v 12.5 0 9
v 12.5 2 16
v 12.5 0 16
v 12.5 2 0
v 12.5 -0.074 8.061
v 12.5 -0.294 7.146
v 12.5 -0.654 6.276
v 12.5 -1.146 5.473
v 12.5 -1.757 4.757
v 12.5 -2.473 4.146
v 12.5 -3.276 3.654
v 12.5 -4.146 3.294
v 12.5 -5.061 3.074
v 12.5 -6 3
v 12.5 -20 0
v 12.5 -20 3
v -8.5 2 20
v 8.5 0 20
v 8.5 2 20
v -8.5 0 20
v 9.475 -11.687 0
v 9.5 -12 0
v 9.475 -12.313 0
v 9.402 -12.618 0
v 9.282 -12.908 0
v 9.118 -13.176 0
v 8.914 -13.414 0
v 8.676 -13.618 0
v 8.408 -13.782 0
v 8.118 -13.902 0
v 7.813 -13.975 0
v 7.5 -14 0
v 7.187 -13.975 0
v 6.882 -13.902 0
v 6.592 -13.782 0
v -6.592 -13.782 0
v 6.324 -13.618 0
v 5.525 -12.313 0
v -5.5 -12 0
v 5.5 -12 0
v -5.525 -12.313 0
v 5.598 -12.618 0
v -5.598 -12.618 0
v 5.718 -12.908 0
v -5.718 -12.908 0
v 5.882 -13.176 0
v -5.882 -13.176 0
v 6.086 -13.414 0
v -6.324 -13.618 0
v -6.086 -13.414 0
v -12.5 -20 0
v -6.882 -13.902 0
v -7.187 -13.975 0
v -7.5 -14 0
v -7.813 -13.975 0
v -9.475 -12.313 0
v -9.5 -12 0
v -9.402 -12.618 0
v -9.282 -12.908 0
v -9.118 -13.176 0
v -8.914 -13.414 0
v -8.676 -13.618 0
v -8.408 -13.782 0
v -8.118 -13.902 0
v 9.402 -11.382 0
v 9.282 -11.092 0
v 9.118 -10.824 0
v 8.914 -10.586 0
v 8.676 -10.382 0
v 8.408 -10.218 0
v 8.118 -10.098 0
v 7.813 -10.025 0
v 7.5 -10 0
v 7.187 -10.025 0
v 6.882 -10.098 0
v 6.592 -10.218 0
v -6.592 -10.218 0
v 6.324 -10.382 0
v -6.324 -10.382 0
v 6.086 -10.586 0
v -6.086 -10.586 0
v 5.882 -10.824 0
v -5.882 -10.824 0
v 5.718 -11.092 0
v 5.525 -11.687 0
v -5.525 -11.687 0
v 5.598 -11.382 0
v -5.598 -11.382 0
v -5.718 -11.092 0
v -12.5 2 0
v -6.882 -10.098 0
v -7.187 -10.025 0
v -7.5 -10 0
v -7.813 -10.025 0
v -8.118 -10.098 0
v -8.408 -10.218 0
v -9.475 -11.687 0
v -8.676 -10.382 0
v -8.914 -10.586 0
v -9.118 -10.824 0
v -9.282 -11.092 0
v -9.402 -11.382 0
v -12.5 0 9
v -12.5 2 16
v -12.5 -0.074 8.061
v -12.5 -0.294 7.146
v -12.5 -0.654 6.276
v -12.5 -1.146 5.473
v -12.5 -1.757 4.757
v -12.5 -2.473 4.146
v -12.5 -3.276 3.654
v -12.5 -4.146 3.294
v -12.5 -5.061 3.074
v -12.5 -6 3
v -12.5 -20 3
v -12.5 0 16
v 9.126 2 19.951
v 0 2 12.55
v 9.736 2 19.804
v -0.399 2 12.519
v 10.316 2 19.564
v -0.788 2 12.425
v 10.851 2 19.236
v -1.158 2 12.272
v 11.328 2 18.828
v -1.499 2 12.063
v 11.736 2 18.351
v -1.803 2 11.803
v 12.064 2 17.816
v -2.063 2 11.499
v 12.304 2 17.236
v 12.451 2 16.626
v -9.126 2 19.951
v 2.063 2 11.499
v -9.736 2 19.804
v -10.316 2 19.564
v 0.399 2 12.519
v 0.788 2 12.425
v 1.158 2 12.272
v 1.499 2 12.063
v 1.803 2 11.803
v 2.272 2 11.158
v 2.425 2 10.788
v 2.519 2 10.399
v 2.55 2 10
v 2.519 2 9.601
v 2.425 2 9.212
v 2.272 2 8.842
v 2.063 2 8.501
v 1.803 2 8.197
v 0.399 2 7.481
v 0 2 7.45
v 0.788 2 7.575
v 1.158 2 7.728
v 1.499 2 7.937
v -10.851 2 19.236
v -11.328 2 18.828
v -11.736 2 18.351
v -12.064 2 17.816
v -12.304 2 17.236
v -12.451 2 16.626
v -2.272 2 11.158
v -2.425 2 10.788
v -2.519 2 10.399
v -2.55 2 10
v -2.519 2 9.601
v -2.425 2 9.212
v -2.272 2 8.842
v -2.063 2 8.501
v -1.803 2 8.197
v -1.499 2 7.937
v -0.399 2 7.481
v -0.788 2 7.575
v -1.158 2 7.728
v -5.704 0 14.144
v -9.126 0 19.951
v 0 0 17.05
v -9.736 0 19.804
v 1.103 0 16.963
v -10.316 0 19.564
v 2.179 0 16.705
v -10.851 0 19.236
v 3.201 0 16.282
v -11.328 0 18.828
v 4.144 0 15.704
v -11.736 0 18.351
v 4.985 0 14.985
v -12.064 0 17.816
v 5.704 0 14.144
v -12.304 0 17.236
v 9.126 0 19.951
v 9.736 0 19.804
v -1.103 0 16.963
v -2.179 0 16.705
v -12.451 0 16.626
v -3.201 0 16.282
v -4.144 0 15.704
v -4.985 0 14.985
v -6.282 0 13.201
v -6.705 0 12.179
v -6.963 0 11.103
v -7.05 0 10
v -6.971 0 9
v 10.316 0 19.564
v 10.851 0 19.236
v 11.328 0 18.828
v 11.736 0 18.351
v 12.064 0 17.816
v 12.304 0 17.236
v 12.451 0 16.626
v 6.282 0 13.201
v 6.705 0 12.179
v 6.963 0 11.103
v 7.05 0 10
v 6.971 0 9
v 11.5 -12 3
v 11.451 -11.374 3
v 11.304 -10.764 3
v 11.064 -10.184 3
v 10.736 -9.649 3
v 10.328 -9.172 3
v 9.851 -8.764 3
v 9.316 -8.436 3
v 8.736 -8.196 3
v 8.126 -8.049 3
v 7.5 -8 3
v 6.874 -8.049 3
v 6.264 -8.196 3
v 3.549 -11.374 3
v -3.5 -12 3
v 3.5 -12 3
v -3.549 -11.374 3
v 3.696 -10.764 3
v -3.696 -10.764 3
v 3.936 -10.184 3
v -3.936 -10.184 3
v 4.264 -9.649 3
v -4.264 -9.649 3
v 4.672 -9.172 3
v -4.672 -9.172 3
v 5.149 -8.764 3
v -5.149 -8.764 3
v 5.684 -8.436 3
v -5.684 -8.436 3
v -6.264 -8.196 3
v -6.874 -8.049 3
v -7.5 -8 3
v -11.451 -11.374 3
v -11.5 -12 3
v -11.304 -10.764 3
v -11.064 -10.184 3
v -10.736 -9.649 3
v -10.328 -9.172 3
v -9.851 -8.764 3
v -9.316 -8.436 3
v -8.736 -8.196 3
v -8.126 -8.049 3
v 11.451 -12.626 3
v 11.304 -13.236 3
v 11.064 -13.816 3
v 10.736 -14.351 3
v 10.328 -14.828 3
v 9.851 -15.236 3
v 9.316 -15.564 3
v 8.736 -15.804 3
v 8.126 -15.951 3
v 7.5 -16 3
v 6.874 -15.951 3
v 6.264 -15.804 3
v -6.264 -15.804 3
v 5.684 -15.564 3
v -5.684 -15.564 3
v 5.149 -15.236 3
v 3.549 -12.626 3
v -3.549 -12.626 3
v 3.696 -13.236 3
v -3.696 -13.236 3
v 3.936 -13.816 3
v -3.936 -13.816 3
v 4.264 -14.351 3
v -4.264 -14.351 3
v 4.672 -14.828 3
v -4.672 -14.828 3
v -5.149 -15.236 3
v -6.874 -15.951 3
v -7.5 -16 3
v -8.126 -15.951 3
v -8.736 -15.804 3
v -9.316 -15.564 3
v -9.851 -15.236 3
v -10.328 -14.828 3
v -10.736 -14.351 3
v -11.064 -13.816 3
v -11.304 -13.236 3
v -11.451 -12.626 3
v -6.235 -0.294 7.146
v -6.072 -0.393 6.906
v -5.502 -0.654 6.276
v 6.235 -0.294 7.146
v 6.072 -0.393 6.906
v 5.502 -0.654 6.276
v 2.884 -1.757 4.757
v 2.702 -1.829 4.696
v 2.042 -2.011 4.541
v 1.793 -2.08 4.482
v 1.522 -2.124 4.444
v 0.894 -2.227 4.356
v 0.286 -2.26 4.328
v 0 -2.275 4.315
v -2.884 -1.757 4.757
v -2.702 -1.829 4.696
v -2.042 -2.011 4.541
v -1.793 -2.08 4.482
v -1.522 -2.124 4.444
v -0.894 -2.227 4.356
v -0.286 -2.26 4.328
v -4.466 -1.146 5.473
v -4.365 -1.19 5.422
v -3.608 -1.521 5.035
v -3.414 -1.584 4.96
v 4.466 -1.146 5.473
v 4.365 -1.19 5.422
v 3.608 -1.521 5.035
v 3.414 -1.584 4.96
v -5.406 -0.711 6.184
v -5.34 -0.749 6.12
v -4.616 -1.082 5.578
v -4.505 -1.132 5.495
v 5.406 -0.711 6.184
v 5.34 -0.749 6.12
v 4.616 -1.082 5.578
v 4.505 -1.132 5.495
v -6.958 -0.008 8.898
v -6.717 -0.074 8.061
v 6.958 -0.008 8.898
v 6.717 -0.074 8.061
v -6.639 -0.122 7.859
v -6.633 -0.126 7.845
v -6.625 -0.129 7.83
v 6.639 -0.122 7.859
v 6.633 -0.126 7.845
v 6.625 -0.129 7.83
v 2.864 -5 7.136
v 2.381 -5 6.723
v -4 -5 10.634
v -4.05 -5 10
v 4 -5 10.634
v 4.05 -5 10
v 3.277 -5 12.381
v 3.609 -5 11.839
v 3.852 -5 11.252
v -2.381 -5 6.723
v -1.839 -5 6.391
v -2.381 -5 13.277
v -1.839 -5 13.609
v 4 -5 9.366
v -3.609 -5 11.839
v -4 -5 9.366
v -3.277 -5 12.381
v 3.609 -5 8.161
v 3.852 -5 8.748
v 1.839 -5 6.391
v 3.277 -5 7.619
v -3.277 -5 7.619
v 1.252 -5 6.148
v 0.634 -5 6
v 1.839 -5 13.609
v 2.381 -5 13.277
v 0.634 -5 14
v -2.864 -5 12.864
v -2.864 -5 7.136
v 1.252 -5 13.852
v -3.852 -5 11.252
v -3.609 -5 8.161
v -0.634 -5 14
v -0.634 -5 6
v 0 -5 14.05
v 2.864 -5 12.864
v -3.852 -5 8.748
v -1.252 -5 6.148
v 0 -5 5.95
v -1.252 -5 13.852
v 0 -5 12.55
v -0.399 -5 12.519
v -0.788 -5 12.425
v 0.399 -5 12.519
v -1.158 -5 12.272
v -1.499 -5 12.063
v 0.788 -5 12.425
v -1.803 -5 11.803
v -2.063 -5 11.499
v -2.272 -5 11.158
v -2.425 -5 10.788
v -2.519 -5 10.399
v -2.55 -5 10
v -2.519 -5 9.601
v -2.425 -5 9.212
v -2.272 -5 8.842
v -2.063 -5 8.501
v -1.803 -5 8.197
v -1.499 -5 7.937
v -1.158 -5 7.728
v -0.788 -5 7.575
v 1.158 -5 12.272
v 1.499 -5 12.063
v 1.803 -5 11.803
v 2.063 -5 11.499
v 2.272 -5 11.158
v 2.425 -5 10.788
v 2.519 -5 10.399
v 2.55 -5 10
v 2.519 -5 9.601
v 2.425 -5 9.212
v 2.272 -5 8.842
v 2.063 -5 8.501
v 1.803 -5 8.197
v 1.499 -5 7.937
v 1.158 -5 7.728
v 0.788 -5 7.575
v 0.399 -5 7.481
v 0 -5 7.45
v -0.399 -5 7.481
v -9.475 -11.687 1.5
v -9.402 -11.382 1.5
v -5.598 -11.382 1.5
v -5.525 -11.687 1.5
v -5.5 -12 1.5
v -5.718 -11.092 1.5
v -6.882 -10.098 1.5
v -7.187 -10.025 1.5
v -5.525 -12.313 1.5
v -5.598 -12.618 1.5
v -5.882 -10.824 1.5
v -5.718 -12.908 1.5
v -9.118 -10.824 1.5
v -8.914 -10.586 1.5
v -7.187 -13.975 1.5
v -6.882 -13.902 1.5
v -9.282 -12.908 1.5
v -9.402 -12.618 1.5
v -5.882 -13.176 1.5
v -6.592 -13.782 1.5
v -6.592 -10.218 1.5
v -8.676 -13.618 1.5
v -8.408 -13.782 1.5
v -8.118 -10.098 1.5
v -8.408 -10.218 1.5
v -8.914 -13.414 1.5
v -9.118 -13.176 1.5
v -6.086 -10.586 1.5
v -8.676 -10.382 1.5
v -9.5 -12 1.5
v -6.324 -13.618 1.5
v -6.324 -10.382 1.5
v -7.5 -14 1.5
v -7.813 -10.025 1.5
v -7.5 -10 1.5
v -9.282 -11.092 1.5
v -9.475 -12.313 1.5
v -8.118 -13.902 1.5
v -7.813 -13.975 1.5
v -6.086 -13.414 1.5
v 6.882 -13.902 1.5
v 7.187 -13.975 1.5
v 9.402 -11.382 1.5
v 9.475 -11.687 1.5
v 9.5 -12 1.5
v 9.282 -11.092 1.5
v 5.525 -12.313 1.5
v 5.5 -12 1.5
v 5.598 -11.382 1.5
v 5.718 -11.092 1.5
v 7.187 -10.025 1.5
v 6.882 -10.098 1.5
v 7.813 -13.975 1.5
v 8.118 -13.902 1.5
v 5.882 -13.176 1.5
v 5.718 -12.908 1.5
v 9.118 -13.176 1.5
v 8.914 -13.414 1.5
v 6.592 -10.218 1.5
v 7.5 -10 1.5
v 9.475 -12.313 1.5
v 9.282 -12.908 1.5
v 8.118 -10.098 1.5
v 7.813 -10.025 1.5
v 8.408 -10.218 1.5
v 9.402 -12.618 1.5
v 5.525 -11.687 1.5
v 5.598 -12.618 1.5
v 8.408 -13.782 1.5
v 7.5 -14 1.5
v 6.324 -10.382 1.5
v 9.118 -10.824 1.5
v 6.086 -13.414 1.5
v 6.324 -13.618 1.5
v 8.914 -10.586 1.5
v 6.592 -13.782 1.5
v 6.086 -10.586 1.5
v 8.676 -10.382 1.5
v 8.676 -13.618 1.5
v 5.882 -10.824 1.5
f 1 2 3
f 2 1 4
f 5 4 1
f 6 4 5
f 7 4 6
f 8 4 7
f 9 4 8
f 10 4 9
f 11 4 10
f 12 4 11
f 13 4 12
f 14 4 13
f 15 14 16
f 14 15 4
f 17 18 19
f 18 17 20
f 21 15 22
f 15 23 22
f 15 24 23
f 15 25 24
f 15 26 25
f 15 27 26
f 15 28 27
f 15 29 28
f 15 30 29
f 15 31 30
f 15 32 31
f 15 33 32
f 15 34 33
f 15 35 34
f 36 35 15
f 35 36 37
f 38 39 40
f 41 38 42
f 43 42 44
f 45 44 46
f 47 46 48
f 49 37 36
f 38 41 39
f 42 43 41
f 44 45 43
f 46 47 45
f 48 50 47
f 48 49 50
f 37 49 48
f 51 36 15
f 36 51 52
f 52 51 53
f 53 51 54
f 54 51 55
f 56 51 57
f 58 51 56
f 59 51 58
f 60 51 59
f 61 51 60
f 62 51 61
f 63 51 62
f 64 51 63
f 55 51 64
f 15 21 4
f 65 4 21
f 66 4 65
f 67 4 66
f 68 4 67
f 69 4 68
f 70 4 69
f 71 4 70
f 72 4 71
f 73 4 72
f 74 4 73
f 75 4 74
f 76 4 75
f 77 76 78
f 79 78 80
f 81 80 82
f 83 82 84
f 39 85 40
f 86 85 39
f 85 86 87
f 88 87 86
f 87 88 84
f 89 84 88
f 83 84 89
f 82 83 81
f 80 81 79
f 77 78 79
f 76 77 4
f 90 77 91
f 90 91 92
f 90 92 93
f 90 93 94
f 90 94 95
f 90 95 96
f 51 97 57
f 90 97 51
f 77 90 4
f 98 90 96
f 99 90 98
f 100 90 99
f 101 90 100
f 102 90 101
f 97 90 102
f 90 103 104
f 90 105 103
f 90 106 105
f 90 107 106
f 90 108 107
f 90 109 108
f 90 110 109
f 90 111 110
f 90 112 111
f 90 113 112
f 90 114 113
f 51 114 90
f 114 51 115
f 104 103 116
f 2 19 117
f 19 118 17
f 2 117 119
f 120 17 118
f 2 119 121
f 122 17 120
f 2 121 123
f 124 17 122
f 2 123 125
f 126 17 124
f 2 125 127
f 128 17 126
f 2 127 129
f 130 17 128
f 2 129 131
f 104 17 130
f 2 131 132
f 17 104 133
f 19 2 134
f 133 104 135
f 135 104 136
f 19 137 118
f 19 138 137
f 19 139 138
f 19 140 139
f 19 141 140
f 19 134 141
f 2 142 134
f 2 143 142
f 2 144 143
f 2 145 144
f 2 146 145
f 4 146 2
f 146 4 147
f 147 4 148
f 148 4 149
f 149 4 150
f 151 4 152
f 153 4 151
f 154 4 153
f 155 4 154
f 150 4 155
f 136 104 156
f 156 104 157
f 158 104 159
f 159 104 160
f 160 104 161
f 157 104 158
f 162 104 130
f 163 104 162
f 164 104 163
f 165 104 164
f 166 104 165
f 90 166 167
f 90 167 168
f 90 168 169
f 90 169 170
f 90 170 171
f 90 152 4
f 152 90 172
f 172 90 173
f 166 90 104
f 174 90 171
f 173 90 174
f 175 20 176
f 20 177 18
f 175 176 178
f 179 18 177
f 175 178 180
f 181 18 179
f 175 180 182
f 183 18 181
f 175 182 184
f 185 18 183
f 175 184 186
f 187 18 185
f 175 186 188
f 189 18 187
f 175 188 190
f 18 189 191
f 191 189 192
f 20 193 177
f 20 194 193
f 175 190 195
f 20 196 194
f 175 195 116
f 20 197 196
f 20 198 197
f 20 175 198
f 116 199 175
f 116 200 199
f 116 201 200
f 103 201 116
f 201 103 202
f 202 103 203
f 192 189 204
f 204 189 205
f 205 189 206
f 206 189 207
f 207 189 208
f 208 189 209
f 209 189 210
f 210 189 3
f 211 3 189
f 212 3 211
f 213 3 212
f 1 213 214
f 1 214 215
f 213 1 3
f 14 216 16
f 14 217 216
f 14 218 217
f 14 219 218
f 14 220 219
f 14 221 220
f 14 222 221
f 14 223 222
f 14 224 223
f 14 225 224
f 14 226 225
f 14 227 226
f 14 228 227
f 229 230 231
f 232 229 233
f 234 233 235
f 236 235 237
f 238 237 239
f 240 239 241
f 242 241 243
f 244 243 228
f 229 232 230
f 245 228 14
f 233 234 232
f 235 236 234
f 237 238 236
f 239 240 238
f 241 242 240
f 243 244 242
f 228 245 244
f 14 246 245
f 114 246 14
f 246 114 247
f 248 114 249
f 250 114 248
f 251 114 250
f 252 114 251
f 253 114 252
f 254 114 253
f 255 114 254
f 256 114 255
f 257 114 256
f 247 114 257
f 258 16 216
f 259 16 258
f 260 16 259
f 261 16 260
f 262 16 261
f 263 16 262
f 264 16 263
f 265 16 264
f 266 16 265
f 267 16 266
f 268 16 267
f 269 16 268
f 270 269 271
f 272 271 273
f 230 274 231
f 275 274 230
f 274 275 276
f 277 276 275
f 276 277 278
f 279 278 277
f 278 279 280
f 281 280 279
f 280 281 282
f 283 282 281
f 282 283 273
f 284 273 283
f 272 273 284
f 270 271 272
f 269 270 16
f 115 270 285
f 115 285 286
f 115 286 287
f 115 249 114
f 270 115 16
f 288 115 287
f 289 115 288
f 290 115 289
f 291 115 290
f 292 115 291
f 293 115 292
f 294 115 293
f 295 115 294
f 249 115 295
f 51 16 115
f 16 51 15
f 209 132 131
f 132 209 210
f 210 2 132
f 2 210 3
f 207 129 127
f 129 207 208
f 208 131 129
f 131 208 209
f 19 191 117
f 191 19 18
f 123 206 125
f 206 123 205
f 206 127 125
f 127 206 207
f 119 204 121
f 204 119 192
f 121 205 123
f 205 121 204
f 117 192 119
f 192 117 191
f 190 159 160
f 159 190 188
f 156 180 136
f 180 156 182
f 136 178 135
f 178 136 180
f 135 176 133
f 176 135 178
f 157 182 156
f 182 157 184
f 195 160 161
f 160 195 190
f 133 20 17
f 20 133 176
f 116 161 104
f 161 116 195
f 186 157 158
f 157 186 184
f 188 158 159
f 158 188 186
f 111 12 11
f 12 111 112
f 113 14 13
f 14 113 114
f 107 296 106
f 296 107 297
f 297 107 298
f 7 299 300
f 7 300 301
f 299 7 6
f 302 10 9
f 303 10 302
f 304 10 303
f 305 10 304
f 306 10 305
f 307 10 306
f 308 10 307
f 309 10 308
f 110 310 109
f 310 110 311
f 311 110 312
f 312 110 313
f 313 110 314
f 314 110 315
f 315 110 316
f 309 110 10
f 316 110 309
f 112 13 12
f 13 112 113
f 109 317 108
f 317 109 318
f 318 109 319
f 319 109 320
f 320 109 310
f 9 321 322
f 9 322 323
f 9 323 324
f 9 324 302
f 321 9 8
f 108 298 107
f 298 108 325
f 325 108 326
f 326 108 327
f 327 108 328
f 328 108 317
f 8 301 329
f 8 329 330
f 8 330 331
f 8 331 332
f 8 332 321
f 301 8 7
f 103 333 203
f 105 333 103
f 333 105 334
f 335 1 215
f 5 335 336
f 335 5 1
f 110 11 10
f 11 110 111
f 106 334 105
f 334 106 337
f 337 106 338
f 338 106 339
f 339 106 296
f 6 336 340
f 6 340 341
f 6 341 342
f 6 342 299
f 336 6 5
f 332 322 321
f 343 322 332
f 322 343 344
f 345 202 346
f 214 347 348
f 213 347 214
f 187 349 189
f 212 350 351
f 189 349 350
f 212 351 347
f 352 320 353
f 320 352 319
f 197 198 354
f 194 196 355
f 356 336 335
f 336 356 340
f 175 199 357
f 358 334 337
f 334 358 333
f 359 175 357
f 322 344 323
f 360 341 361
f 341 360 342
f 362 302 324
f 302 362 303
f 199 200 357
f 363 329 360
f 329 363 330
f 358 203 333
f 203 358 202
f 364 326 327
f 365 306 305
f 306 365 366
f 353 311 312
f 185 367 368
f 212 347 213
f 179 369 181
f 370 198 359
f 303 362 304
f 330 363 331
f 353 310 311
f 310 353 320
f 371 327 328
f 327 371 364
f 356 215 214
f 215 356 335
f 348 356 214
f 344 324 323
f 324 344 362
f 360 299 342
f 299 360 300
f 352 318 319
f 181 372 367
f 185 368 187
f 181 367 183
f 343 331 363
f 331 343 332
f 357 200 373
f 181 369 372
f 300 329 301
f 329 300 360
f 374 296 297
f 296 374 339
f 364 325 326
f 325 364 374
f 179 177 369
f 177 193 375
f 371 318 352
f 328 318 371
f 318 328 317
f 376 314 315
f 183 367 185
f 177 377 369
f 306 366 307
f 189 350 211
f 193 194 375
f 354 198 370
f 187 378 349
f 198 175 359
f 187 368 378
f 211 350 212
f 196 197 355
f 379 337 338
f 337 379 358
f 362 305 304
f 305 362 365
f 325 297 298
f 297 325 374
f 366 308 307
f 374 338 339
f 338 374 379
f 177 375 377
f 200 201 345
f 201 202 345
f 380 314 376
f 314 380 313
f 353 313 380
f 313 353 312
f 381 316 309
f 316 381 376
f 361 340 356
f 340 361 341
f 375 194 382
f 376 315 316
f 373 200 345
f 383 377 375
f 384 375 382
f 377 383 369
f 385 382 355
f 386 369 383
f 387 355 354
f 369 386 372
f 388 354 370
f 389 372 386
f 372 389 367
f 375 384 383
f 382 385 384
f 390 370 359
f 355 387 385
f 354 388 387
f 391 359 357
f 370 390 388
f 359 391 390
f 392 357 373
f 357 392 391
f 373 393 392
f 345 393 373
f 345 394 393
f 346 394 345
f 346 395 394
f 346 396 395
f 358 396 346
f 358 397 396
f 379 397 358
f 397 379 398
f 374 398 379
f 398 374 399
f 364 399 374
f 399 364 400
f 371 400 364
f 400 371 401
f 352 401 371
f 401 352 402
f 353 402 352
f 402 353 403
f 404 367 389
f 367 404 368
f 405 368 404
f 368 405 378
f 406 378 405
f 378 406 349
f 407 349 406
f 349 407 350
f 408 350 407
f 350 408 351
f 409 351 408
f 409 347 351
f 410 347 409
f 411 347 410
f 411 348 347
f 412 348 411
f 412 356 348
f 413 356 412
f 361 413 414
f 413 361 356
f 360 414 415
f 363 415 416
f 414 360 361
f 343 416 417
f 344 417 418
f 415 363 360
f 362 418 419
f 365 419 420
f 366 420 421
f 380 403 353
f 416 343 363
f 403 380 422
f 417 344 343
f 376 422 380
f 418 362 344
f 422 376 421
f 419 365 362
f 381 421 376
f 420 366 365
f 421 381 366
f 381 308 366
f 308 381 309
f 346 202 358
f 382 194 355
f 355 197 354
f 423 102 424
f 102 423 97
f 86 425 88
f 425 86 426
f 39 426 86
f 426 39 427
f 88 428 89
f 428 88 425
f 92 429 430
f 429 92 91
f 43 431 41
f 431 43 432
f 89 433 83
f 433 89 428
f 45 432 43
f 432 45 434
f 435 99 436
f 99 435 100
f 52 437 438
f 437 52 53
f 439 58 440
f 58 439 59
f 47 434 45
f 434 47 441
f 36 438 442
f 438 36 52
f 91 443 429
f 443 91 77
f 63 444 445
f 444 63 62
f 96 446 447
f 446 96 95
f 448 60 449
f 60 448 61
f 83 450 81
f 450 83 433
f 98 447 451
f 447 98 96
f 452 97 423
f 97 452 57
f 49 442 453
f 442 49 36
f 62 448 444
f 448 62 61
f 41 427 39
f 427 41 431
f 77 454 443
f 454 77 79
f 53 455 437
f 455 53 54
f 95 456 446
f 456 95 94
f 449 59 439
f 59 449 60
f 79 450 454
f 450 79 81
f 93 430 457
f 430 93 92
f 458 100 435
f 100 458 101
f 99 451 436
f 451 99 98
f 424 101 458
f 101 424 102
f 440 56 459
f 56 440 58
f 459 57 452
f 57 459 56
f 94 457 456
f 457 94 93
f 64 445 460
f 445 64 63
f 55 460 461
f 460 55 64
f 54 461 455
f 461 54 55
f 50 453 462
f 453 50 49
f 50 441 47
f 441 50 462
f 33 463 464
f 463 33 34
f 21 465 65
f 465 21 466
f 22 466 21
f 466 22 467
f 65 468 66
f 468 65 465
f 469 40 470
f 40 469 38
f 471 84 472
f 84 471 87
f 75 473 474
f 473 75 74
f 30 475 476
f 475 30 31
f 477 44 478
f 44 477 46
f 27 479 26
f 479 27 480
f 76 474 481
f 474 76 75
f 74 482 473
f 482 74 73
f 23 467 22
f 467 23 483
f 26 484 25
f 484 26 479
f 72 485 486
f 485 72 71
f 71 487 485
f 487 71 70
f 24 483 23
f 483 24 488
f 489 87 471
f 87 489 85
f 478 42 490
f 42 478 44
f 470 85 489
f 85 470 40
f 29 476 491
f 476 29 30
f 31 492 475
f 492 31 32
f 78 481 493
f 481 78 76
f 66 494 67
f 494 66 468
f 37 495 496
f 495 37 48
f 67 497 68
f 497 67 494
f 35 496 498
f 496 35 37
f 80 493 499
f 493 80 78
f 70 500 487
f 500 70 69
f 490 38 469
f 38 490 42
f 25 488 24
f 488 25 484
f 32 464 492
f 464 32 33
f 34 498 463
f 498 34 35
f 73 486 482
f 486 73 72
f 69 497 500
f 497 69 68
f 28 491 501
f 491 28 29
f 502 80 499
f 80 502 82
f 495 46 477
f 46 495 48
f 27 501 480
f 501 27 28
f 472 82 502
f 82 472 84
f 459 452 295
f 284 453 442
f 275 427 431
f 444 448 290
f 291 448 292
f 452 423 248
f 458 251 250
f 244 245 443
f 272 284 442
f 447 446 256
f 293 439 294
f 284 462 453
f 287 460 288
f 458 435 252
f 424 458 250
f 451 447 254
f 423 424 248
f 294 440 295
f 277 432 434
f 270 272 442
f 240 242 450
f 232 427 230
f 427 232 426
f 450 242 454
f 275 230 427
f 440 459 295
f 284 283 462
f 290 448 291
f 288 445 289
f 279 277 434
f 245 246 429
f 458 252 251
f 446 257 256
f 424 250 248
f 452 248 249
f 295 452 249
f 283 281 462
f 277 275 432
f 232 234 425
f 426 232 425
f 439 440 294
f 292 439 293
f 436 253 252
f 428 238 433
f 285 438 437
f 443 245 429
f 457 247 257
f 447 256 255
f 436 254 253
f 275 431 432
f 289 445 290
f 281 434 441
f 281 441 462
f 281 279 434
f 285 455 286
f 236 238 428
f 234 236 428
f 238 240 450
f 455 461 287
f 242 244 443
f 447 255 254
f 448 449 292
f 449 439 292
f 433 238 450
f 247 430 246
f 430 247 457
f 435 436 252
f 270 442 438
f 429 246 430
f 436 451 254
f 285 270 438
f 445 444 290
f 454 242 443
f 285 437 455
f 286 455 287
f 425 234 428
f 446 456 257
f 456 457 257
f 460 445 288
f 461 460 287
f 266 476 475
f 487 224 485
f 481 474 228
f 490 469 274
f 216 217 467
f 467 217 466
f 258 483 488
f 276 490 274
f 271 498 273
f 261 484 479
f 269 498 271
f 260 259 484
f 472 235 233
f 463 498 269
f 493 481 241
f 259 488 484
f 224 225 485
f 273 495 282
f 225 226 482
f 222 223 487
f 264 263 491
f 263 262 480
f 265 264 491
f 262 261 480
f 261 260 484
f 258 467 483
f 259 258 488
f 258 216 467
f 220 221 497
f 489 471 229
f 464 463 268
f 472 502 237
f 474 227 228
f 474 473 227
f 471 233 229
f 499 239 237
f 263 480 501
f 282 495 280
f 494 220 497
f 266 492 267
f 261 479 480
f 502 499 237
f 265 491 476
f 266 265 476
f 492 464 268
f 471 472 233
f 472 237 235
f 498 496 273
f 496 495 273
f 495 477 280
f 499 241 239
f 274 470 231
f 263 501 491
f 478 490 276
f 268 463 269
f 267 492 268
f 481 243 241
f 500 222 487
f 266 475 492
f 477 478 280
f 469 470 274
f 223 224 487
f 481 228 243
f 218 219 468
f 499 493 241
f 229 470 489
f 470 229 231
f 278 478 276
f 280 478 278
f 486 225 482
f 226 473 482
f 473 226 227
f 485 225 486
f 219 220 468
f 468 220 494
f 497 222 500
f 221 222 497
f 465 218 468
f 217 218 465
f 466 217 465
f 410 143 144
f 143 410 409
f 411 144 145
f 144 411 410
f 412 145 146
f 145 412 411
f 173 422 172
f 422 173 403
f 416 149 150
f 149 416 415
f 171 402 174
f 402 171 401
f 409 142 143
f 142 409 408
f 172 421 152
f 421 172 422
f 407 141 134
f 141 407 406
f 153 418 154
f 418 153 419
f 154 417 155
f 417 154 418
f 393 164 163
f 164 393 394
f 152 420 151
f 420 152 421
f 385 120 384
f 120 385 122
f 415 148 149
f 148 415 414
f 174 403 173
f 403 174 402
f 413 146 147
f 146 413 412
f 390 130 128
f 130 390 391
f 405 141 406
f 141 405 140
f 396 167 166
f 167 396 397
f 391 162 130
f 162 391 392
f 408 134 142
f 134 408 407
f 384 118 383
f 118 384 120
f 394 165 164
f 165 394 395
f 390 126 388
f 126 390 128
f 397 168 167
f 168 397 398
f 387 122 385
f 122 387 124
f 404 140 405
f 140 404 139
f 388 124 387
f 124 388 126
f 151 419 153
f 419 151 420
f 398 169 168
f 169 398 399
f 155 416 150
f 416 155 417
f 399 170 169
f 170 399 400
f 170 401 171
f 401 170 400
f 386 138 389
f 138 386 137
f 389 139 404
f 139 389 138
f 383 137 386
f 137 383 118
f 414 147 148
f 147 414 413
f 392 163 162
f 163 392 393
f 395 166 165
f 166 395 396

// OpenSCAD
// A 3D Printed Customisable LED bracket by Rod
//17th April 2019
//v3 with rounded corners on upstand

$fn=40;

plate_thickness=2;
bracket_width=25;
upstand_height=20;

base_thickness=3;
base_width=bracket_width;
base_depth=20;

fillet_radius=3;
fillet_width=2*fillet_radius;

LED_Mount_Height=5;
LED_Diameter=5.1;

diameter_fixing=4;

percentage_x=0.6;
percentage_y=0.6;

LED_mount_thickness=1.5;


bracket_radius=2;

module Bracket(){
translate([0,plate_thickness/2, upstand_height/2])
    cube([bracket_width,plate_thickness,upstand_height],true);
 
translate([0,-base_depth/2, base_thickness/2])
    cube([base_width,base_depth,base_thickness],true);
    
//add the corner fillet as a solid cube
translate([0,-fillet_width/2, (fillet_width/2)+base_thickness])
    cube([base_width,fillet_width,fillet_width],true);
   
}


//make the radiused bit to do the removing with
module Cutter(){
    translate([0,-fillet_width,base_thickness+fillet_width])
        rotate([0,90,0])
            cylinder(bracket_width+10,fillet_radius*2,fillet_radius*2,true);
}

module LED_Mount(){
    translate([0,-LED_Mount_Height/2,upstand_height/2])
        rotate([90,0,0])   
            cylinder(LED_Mount_Height,LED_Diameter/2+LED_mount_thickness*3,LED_Diameter/2+LED_mount_thickness,true);  
}

module LED_Clearance(){
    translate([0,-LED_Mount_Height/2,upstand_height/2])
        rotate([90,0,0])   
            cylinder(LED_Mount_Height*10,LED_Diameter/2,LED_Diameter/2,true);   
}


module Mounting_Holes(){
    translate([-base_width*0.5*percentage_x,-base_depth*percentage_y, 0])
        cylinder(100,diameter_fixing/2, diameter_fixing/2,true);

    translate([base_width*0.5*percentage_x,-base_depth*percentage_y, 0])
        cylinder(100,diameter_fixing/2, diameter_fixing/2,true);    
}

module Countersink(){
    translate([-base_width*0.5*percentage_x,-base_depth*percentage_y,base_thickness-(base_thickness*0.25)])
        cylinder(base_thickness*0.5, diameter_fixing/2,diameter_fixing,true);

    translate([base_width*0.5*percentage_x,-base_depth*percentage_y,base_thickness-(base_thickness*0.25)])
        cylinder(base_thickness*0.5, diameter_fixing/2,diameter_fixing,true);       
}

module bracketCorners(){
        //take the sharp corners off the upright
        translate([bracket_width/2-bracket_radius,0,upstand_height-bracket_radius])
            difference(){
                cube([bracket_radius*2,plate_thickness*10,bracket_radius*2],true);
                    translate([-bracket_radius,0,-bracket_radius])
                    rotate([90,0,0])
                    cylinder(plate_thickness*10, bracket_radius*2,bracket_radius*2,true);
            }

        translate([-bracket_width/2+bracket_radius,0,upstand_height-bracket_radius])   
            difference(){
                cube([bracket_radius*2,plate_thickness*10,bracket_radius*2],true);
                    translate([bracket_radius,0,-bracket_radius])
                    rotate([90,0,0])
                    cylinder(plate_thickness*10, bracket_radius*2,bracket_radius*2,true);
            }           
        
}

difference(){
    union(){
        LED_Mount();
        difference(){
            difference(){
                Bracket();
                bracketCorners(); 
            }
            
            Cutter();
        }
    }
    LED_Clearance();
    Mounting_Holes();
    Countersink();
}
